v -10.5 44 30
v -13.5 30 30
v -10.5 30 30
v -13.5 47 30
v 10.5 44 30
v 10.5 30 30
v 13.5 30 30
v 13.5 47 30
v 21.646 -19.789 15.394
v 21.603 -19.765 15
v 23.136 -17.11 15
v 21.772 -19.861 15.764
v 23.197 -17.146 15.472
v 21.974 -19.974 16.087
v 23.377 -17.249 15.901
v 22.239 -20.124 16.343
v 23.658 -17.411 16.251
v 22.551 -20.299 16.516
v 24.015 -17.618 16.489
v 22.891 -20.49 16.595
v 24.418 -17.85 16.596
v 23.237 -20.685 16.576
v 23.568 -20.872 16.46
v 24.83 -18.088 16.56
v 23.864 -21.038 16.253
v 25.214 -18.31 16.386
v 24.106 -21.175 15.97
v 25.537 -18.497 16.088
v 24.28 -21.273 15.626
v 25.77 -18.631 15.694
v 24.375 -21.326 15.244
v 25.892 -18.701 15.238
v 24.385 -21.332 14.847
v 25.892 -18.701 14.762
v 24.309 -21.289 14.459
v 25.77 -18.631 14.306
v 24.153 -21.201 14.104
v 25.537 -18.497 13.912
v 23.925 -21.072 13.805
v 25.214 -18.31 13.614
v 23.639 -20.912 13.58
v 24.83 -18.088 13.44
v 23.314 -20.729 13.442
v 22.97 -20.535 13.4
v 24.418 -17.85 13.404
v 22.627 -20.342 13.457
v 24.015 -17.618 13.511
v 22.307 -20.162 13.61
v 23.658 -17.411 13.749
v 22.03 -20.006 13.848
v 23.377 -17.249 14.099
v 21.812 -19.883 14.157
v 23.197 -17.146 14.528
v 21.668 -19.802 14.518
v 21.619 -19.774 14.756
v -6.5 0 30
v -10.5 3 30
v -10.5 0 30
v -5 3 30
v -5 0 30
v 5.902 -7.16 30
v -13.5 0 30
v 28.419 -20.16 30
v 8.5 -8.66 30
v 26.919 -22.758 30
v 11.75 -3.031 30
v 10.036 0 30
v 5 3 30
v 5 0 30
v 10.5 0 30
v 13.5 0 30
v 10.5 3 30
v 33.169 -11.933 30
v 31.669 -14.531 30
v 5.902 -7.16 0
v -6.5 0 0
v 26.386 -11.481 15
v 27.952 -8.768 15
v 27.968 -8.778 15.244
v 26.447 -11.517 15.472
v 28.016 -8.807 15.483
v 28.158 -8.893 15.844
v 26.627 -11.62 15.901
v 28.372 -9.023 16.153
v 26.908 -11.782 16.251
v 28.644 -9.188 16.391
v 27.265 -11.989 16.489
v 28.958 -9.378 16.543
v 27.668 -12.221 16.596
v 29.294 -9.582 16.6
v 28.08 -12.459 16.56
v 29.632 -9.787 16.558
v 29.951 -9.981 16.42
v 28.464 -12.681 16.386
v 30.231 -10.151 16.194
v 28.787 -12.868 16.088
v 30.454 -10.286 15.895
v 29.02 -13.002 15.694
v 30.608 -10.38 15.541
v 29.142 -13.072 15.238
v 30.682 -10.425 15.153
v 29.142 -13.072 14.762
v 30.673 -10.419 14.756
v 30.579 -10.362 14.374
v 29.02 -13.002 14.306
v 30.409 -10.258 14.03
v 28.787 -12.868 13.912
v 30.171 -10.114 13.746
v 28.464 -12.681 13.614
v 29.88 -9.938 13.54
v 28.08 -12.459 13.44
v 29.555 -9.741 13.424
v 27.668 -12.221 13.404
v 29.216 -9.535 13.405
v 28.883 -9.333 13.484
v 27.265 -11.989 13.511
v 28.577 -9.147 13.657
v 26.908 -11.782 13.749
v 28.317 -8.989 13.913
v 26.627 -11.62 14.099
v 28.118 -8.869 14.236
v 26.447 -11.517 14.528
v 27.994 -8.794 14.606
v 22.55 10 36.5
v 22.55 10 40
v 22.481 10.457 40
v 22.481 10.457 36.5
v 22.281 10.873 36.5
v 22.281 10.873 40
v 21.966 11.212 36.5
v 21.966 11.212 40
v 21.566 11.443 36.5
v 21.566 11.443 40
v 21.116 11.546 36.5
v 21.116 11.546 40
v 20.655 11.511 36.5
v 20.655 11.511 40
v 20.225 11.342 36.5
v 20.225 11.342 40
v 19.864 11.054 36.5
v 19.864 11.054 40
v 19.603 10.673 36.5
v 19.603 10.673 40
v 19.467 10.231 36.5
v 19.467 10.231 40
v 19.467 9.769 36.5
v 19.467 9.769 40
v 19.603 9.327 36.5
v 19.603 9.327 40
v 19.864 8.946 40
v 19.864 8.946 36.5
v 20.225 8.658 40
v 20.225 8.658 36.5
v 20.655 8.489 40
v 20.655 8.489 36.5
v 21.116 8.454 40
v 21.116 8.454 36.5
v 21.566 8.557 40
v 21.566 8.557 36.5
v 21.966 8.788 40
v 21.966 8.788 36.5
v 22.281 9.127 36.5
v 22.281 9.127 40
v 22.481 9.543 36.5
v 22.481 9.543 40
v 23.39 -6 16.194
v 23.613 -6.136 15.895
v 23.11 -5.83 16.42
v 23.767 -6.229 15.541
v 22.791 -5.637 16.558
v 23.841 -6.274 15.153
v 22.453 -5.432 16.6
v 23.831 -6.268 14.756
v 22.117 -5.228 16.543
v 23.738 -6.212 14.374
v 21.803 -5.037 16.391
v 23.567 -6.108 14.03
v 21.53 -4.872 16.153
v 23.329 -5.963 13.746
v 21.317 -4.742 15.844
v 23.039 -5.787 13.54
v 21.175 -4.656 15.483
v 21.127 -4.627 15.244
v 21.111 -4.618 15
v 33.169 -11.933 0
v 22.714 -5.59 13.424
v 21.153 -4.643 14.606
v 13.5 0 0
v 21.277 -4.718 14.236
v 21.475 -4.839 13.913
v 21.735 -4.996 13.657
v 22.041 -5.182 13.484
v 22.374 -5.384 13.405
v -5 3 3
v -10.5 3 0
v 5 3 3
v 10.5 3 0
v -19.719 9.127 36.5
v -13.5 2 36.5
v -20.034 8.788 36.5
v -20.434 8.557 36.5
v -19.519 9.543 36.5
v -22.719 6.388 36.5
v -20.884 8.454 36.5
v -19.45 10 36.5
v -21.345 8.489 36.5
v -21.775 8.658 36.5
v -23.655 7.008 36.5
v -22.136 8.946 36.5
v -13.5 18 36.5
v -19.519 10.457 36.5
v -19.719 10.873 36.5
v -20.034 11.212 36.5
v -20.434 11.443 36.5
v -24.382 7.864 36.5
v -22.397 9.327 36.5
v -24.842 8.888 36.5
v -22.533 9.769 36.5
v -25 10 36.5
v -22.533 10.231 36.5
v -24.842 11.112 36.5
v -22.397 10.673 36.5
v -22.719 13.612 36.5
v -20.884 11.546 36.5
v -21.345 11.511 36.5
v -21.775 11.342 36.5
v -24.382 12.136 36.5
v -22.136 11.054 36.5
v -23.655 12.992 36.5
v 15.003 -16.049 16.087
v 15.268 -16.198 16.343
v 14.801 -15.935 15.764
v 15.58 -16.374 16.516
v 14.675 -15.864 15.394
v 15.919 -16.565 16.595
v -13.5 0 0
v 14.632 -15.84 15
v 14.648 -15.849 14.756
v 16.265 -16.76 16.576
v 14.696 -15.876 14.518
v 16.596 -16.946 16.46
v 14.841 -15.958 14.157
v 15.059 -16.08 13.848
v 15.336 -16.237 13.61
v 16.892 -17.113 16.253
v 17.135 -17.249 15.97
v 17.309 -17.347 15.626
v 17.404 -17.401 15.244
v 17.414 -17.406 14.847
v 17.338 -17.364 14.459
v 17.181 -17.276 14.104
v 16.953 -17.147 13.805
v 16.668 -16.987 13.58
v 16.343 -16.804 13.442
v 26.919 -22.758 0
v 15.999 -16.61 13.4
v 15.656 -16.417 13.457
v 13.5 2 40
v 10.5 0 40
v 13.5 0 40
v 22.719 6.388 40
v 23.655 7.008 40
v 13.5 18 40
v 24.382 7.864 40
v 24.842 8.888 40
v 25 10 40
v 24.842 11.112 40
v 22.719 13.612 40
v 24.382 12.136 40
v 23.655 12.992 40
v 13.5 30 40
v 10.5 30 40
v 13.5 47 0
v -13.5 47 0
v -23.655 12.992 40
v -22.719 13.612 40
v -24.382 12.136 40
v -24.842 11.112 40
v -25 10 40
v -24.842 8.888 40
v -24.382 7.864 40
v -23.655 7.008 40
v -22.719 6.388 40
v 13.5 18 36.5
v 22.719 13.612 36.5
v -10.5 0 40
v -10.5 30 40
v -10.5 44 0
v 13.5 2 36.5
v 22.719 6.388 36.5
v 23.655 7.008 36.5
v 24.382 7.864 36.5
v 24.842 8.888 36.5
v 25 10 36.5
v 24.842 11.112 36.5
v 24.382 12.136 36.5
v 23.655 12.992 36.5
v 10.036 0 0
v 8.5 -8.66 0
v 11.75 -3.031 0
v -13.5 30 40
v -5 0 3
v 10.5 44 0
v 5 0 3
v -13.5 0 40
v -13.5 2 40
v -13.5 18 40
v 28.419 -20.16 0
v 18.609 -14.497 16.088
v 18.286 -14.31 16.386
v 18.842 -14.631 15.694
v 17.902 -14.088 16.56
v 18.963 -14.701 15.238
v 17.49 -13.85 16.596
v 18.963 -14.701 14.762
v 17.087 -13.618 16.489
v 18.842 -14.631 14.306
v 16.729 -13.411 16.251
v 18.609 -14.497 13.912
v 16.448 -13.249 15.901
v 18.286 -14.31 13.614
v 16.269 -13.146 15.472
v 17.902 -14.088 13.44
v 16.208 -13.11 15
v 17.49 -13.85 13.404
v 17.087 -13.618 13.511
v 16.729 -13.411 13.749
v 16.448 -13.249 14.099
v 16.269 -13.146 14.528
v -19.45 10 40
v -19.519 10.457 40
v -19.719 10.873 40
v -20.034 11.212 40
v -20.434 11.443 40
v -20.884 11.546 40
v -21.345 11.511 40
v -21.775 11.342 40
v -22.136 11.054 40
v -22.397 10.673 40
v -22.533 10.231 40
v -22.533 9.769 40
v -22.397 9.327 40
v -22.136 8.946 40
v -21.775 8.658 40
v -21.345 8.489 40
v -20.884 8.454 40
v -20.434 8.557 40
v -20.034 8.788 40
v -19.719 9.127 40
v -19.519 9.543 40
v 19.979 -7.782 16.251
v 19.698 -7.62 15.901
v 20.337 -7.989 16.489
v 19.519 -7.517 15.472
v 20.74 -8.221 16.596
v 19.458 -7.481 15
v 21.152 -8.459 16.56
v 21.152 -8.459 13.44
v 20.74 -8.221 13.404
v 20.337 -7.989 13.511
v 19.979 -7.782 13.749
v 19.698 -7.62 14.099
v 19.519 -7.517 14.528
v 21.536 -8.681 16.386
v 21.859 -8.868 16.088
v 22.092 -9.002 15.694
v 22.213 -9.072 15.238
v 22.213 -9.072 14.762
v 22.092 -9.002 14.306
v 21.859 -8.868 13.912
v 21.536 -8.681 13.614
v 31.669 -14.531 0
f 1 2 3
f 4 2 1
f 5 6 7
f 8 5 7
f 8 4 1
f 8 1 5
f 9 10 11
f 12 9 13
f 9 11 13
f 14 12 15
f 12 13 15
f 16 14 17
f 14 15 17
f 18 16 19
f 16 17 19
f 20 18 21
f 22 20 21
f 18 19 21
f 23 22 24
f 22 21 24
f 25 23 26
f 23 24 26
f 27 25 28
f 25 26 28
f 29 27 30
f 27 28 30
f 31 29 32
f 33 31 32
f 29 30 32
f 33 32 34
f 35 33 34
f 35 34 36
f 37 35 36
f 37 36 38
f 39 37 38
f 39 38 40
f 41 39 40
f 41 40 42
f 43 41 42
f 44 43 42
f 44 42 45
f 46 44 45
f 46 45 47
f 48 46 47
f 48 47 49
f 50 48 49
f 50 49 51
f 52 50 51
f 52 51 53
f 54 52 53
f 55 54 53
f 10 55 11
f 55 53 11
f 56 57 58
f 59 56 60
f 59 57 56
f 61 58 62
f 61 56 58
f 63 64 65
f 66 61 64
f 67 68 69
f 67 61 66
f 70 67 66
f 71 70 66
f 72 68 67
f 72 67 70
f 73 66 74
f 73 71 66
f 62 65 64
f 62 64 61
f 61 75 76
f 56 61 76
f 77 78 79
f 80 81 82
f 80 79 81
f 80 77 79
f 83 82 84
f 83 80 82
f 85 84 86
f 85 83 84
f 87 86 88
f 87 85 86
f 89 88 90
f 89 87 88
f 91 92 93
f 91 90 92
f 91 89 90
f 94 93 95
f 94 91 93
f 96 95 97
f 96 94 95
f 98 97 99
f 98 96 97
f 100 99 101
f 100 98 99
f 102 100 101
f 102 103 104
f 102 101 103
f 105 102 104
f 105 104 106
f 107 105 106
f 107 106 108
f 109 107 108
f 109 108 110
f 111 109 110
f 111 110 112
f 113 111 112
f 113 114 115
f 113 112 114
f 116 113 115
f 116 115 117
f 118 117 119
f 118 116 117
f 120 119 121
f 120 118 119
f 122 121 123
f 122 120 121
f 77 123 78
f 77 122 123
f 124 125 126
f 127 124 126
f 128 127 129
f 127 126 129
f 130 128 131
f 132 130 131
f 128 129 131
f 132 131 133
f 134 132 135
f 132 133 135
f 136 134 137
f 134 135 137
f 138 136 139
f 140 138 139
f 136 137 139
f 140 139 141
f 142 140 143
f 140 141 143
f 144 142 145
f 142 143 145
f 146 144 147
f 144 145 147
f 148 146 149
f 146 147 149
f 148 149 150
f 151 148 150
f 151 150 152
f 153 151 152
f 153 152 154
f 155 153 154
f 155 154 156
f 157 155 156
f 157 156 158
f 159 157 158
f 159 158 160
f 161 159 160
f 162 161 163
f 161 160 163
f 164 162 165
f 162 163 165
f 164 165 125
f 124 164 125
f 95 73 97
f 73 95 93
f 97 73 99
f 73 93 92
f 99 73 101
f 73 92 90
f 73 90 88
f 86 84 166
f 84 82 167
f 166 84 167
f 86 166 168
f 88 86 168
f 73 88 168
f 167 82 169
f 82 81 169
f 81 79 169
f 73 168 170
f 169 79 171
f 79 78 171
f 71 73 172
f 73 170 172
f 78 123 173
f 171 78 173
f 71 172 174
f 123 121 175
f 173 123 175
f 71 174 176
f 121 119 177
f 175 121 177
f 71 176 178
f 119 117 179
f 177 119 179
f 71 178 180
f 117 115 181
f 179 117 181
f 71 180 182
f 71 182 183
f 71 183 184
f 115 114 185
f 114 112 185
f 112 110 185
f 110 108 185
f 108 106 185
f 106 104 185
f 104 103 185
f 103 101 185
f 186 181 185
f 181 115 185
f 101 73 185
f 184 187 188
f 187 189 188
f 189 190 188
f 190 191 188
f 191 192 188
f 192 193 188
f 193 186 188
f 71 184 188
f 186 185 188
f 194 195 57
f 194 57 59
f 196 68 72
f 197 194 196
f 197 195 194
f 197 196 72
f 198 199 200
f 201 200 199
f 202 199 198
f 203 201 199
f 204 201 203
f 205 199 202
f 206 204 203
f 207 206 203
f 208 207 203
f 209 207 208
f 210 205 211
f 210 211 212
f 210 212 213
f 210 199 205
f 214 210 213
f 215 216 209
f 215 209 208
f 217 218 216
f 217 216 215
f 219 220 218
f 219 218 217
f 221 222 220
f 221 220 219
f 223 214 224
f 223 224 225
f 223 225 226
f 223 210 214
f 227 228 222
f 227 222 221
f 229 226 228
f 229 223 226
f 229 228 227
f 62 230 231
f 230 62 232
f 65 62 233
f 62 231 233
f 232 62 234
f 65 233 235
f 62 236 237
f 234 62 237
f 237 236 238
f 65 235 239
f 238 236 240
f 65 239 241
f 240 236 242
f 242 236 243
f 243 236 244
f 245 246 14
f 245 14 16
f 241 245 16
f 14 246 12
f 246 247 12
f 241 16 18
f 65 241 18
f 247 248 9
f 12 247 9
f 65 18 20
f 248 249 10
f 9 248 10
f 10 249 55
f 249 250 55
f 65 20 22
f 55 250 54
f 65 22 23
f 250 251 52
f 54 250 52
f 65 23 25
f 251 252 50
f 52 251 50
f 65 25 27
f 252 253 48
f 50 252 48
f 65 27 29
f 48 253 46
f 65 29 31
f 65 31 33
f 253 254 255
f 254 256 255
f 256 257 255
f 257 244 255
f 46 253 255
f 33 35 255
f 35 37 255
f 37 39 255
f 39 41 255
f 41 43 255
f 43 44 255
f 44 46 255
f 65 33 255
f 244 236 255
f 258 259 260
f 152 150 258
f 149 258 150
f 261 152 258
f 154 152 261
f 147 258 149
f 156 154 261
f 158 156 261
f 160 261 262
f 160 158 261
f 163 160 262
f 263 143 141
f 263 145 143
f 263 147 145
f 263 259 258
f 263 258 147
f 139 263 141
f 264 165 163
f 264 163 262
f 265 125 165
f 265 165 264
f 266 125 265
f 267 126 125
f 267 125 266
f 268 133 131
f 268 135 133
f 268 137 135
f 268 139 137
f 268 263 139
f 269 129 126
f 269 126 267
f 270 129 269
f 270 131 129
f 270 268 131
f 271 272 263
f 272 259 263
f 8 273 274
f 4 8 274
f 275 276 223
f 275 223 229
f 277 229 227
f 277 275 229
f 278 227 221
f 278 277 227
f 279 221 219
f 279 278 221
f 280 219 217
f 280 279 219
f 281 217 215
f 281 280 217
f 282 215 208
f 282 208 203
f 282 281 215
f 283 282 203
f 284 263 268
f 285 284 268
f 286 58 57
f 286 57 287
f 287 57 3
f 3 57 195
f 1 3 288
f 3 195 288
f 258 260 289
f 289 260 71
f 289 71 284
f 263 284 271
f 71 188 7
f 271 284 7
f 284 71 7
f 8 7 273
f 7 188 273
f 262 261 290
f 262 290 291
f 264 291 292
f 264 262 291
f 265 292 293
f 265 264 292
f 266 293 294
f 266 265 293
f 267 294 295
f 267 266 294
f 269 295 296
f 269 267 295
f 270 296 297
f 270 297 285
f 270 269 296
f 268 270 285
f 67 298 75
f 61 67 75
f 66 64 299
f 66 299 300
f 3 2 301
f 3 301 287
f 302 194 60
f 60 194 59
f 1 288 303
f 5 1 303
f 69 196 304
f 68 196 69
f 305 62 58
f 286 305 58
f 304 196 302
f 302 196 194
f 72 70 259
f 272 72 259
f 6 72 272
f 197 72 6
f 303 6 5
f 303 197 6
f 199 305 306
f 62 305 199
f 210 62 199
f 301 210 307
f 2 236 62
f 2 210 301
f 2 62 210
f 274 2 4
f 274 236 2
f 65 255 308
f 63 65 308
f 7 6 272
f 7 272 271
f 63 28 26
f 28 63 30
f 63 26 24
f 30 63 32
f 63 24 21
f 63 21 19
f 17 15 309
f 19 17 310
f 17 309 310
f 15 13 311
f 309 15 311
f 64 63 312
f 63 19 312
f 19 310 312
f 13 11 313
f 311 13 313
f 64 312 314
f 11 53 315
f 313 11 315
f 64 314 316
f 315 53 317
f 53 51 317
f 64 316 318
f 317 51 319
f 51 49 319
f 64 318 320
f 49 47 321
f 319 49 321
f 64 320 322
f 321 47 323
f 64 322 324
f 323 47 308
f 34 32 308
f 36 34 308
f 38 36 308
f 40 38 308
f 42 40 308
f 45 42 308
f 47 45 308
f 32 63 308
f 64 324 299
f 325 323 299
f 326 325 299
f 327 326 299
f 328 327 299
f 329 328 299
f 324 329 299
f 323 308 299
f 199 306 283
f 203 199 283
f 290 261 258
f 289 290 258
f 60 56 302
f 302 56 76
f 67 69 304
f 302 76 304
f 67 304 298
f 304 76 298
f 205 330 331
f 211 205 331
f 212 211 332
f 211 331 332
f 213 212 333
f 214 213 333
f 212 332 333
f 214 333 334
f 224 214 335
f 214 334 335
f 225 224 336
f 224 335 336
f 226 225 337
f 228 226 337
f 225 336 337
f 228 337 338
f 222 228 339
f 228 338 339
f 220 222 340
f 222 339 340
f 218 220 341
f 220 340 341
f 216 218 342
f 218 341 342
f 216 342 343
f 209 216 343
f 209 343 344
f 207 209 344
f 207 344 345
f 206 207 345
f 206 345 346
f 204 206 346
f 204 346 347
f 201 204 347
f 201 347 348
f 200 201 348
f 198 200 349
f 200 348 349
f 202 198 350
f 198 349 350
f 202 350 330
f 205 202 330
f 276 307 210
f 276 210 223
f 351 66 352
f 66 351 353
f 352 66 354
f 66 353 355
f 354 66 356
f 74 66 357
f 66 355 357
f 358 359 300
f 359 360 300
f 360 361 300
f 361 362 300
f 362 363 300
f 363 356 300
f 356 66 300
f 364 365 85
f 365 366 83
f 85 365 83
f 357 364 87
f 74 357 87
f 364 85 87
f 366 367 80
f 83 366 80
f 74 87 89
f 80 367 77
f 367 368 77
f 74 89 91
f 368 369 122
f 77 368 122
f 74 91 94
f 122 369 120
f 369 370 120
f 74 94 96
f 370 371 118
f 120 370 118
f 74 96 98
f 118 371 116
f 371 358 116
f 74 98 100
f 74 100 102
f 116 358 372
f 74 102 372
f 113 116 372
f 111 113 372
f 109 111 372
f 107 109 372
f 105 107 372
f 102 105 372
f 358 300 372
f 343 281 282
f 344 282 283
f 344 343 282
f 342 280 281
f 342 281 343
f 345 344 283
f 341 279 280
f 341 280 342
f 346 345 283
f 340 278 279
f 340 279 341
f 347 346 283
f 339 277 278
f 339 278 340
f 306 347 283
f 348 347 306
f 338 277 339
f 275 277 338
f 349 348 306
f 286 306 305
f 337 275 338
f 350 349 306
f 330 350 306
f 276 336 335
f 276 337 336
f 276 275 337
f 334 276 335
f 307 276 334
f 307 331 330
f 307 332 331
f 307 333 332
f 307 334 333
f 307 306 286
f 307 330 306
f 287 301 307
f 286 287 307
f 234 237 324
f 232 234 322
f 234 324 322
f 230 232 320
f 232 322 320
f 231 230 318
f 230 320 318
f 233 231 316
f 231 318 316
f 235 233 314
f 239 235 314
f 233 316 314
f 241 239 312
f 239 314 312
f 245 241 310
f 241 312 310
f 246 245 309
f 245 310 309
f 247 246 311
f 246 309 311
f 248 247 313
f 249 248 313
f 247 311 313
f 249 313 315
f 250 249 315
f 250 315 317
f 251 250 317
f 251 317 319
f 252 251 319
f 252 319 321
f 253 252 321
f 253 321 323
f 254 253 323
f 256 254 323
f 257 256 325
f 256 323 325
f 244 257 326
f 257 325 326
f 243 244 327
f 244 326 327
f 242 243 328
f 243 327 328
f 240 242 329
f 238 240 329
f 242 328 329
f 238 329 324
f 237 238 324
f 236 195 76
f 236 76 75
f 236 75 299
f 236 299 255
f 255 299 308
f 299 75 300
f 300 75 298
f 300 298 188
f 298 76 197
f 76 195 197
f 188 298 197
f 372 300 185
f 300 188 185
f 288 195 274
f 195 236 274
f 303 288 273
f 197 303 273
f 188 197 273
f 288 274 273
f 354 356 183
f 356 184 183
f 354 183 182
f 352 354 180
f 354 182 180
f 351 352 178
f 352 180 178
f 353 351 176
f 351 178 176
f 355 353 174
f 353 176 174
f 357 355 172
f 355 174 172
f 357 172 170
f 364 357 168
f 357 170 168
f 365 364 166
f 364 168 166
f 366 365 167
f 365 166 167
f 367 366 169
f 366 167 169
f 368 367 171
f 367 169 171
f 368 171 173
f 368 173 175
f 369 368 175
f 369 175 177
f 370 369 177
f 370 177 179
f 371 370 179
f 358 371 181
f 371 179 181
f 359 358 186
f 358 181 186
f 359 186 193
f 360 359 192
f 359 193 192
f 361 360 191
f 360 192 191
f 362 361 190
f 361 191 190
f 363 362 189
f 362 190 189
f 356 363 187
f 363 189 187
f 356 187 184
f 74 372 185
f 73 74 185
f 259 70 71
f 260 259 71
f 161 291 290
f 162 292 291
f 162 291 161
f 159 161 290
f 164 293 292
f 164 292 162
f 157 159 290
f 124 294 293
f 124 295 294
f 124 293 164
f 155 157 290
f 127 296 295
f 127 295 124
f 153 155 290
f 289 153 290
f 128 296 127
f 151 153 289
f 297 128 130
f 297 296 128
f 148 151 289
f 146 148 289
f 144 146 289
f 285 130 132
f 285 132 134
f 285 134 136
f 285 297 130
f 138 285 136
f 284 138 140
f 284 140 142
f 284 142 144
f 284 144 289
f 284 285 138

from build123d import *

# Parameters (mm, degrees)
SKETCH_W        = 21
SKETCH_H        = 41
PAD_DEPTH       = 30
SKETCH001_W     = 10
SKETCH001_H     = 27
POCKET_DEPTH    = 3.1
SKETCH002_R     = 1.6
POCKET001_DEPTH = 12.5
SKETCH003_W     = 3
SKETCH003_H     = 30
PAD001_DEPTH    = 10
SKETCH004_R     = 1.55
PAD002_DEPTH    = 3.5


with BuildPart() as part:
    # Sketch → Pad (new body)
    with BuildSketch(Plane.XY):
        Polygon((13.5, 0), (13.5, 47), (-13.5, 47), (-13.5, 0), (26.918584287, -22.7583302492), (28.418584287, -20.1602540378), (8.5, -8.6602540378), (11.75, -3.0310889132), (31.668584287, -14.5310889132), (33.168584287, -11.9330127019), align=None)
        with Locations((0, 23.5)):
            Rectangle(SKETCH_W, SKETCH_H, mode=Mode.SUBTRACT)
        Polygon((-6.5, 0), (10.0358983849, 0), (5.9019237886, -7.1602540378), align=None, mode=Mode.SUBTRACT)
    extrude(amount=PAD_DEPTH)

    # Sketch001 (on Face11 of Pad) → Pocket (cut)
    with BuildSketch(Plane(origin=(0, 3, 0), x_dir=(-1, 0, 0), z_dir=(0, 1, 0))):
        with Locations((0, 16.5)):
            Rectangle(SKETCH001_W, SKETCH001_H)
    extrude(amount=-POCKET_DEPTH, mode=Mode.SUBTRACT)

    # Sketch002 (on Face10 of Pocket) → Pocket001 (cut, symmetric)
    with BuildSketch(Plane(origin=(-1.625, -2.8145825623, 0), x_dir=(-0.8660254038, 0.5, 0), z_dir=(0.5, 0.8660254038, 0))):
        with Locations((-30.1913429511, 15)):
            Circle(SKETCH002_R)
        with Locations((-22.1913429511, 15)):
            Circle(SKETCH002_R)
    extrude(amount=POCKET001_DEPTH, both=True, mode=Mode.SUBTRACT)

    # Sketch003 (on Face5 of Pocket001) → Pad001 (join)
    with BuildSketch(Plane.XY.offset(30)):
        with Locations((-12, 15)):
            Rectangle(SKETCH003_W, SKETCH003_H)
        with Locations((12, 15)):
            Rectangle(SKETCH003_W, SKETCH003_H)
    extrude(amount=PAD001_DEPTH)

    # Sketch004 (on Face26 of Pad001) → Pad002 (join)
    with BuildSketch(Plane.XY.offset(40)):
        with BuildLine():
            Line((-13.5, 18), (-13.5, 2))
            Line((-13.5, 2), (-22.7191621265, 6.3882855064))
            ThreePointArc((-22.7191621265, 13.6117144936), (-25, 10), (-22.7191621265, 6.3882855064))
            Line((-13.5, 18), (-22.7191621265, 13.6117144936))
        make_face()
        with Locations((-21, 10)):
            Circle(SKETCH004_R, mode=Mode.SUBTRACT)
        with BuildLine():
            Line((22.7191621265, 6.3882855064), (13.5, 2))
            Line((13.5, 2), (13.5, 18))
            Line((13.5, 18), (22.7191621265, 13.6117144936))
            ThreePointArc((22.7191621265, 6.3882855064), (25, 10), (22.7191621265, 13.6117144936))
        make_face()
        with Locations((21, 10)):
            Circle(SKETCH004_R, mode=Mode.SUBTRACT)
    extrude(amount=-PAD002_DEPTH)


solid = part.part
